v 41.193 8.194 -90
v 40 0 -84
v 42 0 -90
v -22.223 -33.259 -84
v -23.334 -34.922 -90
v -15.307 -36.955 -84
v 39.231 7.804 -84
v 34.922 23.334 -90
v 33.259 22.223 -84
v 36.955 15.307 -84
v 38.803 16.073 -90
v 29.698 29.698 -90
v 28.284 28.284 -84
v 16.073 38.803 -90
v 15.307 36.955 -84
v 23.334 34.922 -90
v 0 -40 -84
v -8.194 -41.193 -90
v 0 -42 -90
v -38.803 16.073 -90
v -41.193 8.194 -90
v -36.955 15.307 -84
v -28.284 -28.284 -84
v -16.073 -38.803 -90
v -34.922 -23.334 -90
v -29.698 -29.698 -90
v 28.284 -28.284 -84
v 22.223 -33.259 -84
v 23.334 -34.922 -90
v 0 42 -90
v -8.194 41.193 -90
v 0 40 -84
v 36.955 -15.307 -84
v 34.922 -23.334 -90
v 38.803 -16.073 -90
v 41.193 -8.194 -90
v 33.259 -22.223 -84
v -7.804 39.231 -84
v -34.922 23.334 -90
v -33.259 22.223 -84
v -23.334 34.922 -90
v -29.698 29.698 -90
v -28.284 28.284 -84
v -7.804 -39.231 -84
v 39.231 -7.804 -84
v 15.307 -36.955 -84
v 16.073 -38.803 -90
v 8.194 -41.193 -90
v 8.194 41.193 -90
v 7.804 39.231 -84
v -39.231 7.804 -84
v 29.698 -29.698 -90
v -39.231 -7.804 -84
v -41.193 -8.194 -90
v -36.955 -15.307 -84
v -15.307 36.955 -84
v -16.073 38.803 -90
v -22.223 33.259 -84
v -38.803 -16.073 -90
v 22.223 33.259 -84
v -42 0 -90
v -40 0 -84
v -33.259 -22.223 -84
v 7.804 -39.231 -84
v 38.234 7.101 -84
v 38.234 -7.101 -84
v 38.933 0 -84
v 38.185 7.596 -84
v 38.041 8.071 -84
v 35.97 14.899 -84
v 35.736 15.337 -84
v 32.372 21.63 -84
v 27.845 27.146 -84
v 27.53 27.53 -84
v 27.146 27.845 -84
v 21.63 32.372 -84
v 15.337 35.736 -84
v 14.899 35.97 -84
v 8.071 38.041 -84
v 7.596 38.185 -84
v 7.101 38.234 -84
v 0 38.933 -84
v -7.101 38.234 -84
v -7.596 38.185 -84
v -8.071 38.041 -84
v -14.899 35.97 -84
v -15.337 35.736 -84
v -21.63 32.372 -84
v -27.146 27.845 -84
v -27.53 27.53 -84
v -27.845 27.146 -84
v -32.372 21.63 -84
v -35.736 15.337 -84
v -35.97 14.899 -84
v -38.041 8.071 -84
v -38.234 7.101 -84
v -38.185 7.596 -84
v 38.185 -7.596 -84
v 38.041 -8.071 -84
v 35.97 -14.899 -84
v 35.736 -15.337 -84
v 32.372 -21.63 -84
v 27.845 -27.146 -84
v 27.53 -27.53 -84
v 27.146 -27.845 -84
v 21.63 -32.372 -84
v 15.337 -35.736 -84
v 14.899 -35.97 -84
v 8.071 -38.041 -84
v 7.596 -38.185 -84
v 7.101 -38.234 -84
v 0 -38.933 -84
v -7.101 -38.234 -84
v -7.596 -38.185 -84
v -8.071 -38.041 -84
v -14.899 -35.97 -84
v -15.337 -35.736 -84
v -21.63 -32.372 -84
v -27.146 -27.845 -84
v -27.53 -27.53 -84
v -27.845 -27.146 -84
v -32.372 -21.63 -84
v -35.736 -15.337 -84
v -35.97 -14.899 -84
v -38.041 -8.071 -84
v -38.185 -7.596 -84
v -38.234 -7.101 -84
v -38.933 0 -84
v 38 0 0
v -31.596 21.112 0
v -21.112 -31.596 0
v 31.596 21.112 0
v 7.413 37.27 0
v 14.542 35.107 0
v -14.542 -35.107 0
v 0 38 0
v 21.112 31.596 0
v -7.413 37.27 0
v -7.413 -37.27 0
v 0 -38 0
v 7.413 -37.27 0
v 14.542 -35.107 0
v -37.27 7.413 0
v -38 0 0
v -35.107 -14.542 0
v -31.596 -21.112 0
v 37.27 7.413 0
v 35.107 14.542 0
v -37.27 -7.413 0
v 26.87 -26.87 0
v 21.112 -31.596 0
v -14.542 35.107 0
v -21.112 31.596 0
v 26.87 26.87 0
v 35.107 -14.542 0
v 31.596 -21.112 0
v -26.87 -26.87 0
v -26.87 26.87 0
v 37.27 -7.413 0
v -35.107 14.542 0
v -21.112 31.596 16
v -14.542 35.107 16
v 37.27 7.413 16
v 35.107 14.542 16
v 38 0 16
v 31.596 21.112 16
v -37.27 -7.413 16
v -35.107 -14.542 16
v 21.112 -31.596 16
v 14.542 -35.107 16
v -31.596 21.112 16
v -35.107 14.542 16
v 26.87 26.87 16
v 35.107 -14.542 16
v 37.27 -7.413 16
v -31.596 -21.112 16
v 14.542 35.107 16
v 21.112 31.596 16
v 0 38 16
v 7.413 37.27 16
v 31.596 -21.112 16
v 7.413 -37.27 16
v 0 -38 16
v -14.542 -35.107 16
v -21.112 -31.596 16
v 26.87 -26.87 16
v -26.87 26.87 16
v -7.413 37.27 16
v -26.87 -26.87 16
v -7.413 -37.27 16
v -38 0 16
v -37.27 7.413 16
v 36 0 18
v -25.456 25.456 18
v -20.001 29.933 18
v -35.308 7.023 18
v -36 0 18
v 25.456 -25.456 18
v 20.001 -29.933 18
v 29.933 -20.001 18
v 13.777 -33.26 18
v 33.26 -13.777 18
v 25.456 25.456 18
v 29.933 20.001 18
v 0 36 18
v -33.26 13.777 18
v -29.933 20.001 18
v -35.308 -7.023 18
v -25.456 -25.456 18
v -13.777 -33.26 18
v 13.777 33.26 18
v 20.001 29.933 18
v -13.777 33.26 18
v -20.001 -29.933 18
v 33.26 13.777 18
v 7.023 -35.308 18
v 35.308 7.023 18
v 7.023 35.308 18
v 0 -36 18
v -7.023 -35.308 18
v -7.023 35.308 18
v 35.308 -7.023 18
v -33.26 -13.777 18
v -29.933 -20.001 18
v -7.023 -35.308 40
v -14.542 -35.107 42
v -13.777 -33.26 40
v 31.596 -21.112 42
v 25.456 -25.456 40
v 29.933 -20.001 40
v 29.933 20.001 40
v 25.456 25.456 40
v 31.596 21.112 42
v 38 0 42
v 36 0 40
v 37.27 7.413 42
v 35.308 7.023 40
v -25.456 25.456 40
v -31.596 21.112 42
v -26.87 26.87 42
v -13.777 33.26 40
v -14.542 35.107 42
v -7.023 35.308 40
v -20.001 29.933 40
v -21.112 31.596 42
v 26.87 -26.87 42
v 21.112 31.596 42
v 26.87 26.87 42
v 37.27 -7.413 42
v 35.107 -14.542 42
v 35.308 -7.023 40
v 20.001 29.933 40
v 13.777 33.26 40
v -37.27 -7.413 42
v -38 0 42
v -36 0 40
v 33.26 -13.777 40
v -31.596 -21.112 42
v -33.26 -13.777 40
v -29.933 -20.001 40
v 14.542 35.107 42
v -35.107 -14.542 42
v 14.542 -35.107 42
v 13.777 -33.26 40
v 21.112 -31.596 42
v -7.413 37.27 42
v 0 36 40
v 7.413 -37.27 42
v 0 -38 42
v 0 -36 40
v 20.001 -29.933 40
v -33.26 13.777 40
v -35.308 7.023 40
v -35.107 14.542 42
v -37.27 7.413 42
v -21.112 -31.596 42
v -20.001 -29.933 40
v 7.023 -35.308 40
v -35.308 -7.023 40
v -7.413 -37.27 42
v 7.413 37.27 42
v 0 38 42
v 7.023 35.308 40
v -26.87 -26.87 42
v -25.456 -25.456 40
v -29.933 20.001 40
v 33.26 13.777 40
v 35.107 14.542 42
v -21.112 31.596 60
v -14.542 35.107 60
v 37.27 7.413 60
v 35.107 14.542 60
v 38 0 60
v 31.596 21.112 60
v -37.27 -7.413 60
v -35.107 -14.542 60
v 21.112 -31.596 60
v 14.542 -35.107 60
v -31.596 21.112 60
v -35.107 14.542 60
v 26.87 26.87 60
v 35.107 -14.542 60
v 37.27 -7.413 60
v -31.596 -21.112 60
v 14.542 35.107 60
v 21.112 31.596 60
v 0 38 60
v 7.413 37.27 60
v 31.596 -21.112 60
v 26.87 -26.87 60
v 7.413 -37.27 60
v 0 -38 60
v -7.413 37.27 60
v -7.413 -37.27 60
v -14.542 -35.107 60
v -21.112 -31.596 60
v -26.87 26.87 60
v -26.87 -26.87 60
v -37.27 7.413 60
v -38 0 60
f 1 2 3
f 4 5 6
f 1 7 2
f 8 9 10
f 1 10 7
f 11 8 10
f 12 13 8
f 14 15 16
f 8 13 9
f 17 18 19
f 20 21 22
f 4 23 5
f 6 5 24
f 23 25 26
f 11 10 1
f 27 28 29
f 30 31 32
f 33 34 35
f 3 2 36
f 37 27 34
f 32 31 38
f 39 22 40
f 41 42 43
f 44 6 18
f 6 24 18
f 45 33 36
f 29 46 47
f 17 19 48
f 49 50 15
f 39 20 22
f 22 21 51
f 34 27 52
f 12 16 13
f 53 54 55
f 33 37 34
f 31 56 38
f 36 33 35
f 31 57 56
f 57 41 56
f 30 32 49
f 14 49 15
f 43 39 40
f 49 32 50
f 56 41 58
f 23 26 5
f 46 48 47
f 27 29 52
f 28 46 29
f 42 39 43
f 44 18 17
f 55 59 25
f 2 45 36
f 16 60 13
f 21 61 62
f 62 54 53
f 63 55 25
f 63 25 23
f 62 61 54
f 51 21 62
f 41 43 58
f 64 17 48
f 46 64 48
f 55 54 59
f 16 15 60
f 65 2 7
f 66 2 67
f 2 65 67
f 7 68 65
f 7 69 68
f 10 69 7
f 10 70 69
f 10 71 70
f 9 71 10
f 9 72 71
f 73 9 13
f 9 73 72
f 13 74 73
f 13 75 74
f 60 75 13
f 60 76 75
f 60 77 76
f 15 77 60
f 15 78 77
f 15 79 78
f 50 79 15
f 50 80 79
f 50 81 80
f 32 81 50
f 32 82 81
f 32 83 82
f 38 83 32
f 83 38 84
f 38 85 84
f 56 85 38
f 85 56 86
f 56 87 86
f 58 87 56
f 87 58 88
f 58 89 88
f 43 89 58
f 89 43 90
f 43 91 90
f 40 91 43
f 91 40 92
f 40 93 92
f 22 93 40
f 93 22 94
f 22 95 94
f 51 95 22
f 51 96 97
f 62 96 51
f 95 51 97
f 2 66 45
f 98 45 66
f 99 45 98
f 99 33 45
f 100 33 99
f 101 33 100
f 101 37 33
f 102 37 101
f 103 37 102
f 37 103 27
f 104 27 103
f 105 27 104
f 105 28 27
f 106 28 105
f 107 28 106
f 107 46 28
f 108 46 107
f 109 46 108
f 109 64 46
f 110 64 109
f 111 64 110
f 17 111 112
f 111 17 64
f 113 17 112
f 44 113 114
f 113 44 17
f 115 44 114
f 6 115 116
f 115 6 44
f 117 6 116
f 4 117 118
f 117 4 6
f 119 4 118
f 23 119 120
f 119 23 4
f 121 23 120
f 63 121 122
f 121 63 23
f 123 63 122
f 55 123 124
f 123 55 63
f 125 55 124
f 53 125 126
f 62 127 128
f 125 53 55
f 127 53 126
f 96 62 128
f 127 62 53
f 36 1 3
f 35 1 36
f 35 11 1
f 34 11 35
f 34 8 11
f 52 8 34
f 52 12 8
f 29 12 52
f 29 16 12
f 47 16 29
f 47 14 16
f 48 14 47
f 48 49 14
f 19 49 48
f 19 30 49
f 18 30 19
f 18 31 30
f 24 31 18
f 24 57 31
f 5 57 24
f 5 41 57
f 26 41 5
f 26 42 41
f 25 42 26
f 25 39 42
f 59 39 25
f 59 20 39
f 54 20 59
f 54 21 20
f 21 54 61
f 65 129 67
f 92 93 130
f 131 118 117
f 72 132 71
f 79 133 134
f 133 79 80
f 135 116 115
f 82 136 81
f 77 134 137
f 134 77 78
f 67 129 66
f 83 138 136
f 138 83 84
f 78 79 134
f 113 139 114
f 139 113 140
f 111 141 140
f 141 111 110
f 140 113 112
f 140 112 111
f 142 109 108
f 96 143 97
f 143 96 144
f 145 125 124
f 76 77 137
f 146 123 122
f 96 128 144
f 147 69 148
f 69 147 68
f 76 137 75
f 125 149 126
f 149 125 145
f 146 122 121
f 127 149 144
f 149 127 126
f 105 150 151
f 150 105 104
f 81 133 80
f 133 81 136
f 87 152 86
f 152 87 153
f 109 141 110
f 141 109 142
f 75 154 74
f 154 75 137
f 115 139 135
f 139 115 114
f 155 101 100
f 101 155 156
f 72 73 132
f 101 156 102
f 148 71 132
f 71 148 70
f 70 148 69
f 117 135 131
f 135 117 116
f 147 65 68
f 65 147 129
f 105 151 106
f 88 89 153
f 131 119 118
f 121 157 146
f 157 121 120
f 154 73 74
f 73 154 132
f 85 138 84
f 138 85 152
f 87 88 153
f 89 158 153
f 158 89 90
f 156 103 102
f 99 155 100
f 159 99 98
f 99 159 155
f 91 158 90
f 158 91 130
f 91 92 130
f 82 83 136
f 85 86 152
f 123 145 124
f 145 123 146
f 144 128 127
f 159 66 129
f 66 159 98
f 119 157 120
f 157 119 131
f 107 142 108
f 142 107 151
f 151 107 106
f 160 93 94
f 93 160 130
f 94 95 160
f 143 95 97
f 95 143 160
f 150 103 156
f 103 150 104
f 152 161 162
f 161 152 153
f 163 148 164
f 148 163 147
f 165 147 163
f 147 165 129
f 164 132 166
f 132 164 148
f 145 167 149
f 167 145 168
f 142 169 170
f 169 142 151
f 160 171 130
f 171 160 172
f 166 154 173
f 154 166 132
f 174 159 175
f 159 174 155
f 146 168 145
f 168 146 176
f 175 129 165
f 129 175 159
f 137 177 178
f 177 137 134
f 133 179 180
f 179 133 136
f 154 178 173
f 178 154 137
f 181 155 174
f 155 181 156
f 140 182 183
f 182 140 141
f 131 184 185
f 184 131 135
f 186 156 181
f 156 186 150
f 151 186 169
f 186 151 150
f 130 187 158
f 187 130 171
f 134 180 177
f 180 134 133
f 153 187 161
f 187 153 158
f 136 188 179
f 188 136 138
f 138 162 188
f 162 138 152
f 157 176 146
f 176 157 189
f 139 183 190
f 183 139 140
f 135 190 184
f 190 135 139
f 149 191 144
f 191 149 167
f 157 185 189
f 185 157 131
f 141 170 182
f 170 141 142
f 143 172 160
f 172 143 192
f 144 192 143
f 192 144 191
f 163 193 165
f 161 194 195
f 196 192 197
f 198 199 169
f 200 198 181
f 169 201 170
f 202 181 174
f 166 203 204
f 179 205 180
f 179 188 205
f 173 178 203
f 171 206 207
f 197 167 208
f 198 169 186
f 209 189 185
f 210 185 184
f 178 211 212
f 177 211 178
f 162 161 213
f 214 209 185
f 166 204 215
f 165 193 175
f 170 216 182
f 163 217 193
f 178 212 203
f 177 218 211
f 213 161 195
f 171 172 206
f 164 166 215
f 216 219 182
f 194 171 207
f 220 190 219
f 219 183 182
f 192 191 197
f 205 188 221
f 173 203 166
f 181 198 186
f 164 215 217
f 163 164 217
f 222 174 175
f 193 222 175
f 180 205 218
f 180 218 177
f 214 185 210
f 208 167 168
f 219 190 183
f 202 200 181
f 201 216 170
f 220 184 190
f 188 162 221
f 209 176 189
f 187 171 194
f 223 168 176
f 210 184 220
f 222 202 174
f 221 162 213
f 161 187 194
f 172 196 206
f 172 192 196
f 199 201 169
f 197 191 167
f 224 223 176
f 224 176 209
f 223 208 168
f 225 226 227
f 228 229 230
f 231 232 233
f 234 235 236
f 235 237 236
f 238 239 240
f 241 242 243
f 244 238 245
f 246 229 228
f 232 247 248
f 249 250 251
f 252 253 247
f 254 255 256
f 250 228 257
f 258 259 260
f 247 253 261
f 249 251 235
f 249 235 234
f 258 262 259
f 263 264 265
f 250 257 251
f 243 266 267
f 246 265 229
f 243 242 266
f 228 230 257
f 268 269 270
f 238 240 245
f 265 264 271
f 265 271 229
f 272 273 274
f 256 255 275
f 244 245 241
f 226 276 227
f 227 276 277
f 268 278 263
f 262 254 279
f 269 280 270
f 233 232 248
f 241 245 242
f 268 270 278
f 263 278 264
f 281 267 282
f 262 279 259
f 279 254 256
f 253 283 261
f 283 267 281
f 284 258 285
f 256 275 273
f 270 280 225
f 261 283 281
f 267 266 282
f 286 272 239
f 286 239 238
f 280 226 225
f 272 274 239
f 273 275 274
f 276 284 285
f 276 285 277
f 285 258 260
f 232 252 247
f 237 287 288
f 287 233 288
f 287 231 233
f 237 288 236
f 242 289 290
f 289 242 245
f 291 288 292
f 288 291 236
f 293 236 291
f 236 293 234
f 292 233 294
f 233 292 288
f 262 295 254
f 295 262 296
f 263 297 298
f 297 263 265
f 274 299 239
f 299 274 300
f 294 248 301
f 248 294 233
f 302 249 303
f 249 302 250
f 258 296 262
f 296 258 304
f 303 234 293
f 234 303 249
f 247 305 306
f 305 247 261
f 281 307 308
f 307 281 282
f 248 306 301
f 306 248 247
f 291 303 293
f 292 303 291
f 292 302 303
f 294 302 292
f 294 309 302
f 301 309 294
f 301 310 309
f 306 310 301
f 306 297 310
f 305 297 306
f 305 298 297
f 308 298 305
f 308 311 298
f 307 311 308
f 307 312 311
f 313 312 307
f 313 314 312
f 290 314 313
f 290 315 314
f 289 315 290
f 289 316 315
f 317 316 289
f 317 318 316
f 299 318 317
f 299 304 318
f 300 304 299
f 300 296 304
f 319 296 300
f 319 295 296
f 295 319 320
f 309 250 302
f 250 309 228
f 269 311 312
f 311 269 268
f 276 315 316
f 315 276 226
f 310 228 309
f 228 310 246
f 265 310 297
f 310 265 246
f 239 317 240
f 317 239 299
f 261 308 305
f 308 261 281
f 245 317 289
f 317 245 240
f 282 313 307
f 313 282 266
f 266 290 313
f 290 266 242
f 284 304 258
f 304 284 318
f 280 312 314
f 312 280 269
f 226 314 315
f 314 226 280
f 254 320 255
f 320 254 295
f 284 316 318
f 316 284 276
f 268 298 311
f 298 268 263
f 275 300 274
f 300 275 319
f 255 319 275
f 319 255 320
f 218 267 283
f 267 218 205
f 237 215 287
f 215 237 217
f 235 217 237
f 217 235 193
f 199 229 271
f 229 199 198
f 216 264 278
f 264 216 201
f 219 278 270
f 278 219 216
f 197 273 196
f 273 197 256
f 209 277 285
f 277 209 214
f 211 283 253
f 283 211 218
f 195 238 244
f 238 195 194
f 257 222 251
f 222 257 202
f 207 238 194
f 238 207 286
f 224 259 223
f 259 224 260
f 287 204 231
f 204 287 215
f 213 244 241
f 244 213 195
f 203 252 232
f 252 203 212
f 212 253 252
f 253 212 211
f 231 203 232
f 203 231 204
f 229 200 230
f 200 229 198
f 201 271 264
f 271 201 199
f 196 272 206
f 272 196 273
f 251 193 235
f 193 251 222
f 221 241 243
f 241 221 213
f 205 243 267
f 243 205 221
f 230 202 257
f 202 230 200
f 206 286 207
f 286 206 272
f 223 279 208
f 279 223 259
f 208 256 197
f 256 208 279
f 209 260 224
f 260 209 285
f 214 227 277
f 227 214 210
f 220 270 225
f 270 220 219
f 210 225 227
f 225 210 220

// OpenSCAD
// ============================================================================
// FILE: export_lidar.scad
// OUTPUT: lidar_visual.stl
// PURPOSE: Export only the 2D LiDAR and its mounting pedestal.
// ============================================================================

// Chi nap module va function tu main.scad.
// Khong chay factory_scene() trong main.scad.
use <main.scad>


// ============================================================================
// RENDER SETTINGS
// Units: millimeters
// ============================================================================

eps = 0.05;

quality = "render";

preview_fn = 32;
render_fn  = 72;

$fn = quality == "render"
    ? render_fn
    : preview_fn;


// ============================================================================
// PARAMETERS REQUIRED BY lidar_2d()
// ============================================================================

// Main body height is used to calculate the pedestal height:
//
// pedestal_h = lidar_mount_height - robot_body_height
robot_body_height = 300;


// LiDAR position in the original robot coordinate system
lidar_pos_x        = 368;
lidar_mount_height = 390;


// LiDAR body dimensions
lidar_diameter = 76;
lidar_height   = 60;


// Disable component text labels during STL export
show_component_labels = false;


// ============================================================================
// LIDAR EXPORT
// ============================================================================
//
// Original LiDAR link frame:
//
// X = 368 mm
// Y = 0 mm
// Z = 390 mm
//
// The translation moves this frame to STL origin [0, 0, 0].
//
// The pedestal extends from:
//
// Z = 300 mm to Z = 390 mm
//
// Therefore, after moving the LiDAR frame to the STL origin,
// the pedestal extends from Z = -90 mm to Z = 0 mm.
//
// This is correct.
//
// In URDF, restore the LiDAR position with:
//
// origin xyz="0.368 0 0.390"
// ============================================================================

translate([
    -lidar_pos_x,
    0,
    -lidar_mount_height
])
    lidar_2d();
